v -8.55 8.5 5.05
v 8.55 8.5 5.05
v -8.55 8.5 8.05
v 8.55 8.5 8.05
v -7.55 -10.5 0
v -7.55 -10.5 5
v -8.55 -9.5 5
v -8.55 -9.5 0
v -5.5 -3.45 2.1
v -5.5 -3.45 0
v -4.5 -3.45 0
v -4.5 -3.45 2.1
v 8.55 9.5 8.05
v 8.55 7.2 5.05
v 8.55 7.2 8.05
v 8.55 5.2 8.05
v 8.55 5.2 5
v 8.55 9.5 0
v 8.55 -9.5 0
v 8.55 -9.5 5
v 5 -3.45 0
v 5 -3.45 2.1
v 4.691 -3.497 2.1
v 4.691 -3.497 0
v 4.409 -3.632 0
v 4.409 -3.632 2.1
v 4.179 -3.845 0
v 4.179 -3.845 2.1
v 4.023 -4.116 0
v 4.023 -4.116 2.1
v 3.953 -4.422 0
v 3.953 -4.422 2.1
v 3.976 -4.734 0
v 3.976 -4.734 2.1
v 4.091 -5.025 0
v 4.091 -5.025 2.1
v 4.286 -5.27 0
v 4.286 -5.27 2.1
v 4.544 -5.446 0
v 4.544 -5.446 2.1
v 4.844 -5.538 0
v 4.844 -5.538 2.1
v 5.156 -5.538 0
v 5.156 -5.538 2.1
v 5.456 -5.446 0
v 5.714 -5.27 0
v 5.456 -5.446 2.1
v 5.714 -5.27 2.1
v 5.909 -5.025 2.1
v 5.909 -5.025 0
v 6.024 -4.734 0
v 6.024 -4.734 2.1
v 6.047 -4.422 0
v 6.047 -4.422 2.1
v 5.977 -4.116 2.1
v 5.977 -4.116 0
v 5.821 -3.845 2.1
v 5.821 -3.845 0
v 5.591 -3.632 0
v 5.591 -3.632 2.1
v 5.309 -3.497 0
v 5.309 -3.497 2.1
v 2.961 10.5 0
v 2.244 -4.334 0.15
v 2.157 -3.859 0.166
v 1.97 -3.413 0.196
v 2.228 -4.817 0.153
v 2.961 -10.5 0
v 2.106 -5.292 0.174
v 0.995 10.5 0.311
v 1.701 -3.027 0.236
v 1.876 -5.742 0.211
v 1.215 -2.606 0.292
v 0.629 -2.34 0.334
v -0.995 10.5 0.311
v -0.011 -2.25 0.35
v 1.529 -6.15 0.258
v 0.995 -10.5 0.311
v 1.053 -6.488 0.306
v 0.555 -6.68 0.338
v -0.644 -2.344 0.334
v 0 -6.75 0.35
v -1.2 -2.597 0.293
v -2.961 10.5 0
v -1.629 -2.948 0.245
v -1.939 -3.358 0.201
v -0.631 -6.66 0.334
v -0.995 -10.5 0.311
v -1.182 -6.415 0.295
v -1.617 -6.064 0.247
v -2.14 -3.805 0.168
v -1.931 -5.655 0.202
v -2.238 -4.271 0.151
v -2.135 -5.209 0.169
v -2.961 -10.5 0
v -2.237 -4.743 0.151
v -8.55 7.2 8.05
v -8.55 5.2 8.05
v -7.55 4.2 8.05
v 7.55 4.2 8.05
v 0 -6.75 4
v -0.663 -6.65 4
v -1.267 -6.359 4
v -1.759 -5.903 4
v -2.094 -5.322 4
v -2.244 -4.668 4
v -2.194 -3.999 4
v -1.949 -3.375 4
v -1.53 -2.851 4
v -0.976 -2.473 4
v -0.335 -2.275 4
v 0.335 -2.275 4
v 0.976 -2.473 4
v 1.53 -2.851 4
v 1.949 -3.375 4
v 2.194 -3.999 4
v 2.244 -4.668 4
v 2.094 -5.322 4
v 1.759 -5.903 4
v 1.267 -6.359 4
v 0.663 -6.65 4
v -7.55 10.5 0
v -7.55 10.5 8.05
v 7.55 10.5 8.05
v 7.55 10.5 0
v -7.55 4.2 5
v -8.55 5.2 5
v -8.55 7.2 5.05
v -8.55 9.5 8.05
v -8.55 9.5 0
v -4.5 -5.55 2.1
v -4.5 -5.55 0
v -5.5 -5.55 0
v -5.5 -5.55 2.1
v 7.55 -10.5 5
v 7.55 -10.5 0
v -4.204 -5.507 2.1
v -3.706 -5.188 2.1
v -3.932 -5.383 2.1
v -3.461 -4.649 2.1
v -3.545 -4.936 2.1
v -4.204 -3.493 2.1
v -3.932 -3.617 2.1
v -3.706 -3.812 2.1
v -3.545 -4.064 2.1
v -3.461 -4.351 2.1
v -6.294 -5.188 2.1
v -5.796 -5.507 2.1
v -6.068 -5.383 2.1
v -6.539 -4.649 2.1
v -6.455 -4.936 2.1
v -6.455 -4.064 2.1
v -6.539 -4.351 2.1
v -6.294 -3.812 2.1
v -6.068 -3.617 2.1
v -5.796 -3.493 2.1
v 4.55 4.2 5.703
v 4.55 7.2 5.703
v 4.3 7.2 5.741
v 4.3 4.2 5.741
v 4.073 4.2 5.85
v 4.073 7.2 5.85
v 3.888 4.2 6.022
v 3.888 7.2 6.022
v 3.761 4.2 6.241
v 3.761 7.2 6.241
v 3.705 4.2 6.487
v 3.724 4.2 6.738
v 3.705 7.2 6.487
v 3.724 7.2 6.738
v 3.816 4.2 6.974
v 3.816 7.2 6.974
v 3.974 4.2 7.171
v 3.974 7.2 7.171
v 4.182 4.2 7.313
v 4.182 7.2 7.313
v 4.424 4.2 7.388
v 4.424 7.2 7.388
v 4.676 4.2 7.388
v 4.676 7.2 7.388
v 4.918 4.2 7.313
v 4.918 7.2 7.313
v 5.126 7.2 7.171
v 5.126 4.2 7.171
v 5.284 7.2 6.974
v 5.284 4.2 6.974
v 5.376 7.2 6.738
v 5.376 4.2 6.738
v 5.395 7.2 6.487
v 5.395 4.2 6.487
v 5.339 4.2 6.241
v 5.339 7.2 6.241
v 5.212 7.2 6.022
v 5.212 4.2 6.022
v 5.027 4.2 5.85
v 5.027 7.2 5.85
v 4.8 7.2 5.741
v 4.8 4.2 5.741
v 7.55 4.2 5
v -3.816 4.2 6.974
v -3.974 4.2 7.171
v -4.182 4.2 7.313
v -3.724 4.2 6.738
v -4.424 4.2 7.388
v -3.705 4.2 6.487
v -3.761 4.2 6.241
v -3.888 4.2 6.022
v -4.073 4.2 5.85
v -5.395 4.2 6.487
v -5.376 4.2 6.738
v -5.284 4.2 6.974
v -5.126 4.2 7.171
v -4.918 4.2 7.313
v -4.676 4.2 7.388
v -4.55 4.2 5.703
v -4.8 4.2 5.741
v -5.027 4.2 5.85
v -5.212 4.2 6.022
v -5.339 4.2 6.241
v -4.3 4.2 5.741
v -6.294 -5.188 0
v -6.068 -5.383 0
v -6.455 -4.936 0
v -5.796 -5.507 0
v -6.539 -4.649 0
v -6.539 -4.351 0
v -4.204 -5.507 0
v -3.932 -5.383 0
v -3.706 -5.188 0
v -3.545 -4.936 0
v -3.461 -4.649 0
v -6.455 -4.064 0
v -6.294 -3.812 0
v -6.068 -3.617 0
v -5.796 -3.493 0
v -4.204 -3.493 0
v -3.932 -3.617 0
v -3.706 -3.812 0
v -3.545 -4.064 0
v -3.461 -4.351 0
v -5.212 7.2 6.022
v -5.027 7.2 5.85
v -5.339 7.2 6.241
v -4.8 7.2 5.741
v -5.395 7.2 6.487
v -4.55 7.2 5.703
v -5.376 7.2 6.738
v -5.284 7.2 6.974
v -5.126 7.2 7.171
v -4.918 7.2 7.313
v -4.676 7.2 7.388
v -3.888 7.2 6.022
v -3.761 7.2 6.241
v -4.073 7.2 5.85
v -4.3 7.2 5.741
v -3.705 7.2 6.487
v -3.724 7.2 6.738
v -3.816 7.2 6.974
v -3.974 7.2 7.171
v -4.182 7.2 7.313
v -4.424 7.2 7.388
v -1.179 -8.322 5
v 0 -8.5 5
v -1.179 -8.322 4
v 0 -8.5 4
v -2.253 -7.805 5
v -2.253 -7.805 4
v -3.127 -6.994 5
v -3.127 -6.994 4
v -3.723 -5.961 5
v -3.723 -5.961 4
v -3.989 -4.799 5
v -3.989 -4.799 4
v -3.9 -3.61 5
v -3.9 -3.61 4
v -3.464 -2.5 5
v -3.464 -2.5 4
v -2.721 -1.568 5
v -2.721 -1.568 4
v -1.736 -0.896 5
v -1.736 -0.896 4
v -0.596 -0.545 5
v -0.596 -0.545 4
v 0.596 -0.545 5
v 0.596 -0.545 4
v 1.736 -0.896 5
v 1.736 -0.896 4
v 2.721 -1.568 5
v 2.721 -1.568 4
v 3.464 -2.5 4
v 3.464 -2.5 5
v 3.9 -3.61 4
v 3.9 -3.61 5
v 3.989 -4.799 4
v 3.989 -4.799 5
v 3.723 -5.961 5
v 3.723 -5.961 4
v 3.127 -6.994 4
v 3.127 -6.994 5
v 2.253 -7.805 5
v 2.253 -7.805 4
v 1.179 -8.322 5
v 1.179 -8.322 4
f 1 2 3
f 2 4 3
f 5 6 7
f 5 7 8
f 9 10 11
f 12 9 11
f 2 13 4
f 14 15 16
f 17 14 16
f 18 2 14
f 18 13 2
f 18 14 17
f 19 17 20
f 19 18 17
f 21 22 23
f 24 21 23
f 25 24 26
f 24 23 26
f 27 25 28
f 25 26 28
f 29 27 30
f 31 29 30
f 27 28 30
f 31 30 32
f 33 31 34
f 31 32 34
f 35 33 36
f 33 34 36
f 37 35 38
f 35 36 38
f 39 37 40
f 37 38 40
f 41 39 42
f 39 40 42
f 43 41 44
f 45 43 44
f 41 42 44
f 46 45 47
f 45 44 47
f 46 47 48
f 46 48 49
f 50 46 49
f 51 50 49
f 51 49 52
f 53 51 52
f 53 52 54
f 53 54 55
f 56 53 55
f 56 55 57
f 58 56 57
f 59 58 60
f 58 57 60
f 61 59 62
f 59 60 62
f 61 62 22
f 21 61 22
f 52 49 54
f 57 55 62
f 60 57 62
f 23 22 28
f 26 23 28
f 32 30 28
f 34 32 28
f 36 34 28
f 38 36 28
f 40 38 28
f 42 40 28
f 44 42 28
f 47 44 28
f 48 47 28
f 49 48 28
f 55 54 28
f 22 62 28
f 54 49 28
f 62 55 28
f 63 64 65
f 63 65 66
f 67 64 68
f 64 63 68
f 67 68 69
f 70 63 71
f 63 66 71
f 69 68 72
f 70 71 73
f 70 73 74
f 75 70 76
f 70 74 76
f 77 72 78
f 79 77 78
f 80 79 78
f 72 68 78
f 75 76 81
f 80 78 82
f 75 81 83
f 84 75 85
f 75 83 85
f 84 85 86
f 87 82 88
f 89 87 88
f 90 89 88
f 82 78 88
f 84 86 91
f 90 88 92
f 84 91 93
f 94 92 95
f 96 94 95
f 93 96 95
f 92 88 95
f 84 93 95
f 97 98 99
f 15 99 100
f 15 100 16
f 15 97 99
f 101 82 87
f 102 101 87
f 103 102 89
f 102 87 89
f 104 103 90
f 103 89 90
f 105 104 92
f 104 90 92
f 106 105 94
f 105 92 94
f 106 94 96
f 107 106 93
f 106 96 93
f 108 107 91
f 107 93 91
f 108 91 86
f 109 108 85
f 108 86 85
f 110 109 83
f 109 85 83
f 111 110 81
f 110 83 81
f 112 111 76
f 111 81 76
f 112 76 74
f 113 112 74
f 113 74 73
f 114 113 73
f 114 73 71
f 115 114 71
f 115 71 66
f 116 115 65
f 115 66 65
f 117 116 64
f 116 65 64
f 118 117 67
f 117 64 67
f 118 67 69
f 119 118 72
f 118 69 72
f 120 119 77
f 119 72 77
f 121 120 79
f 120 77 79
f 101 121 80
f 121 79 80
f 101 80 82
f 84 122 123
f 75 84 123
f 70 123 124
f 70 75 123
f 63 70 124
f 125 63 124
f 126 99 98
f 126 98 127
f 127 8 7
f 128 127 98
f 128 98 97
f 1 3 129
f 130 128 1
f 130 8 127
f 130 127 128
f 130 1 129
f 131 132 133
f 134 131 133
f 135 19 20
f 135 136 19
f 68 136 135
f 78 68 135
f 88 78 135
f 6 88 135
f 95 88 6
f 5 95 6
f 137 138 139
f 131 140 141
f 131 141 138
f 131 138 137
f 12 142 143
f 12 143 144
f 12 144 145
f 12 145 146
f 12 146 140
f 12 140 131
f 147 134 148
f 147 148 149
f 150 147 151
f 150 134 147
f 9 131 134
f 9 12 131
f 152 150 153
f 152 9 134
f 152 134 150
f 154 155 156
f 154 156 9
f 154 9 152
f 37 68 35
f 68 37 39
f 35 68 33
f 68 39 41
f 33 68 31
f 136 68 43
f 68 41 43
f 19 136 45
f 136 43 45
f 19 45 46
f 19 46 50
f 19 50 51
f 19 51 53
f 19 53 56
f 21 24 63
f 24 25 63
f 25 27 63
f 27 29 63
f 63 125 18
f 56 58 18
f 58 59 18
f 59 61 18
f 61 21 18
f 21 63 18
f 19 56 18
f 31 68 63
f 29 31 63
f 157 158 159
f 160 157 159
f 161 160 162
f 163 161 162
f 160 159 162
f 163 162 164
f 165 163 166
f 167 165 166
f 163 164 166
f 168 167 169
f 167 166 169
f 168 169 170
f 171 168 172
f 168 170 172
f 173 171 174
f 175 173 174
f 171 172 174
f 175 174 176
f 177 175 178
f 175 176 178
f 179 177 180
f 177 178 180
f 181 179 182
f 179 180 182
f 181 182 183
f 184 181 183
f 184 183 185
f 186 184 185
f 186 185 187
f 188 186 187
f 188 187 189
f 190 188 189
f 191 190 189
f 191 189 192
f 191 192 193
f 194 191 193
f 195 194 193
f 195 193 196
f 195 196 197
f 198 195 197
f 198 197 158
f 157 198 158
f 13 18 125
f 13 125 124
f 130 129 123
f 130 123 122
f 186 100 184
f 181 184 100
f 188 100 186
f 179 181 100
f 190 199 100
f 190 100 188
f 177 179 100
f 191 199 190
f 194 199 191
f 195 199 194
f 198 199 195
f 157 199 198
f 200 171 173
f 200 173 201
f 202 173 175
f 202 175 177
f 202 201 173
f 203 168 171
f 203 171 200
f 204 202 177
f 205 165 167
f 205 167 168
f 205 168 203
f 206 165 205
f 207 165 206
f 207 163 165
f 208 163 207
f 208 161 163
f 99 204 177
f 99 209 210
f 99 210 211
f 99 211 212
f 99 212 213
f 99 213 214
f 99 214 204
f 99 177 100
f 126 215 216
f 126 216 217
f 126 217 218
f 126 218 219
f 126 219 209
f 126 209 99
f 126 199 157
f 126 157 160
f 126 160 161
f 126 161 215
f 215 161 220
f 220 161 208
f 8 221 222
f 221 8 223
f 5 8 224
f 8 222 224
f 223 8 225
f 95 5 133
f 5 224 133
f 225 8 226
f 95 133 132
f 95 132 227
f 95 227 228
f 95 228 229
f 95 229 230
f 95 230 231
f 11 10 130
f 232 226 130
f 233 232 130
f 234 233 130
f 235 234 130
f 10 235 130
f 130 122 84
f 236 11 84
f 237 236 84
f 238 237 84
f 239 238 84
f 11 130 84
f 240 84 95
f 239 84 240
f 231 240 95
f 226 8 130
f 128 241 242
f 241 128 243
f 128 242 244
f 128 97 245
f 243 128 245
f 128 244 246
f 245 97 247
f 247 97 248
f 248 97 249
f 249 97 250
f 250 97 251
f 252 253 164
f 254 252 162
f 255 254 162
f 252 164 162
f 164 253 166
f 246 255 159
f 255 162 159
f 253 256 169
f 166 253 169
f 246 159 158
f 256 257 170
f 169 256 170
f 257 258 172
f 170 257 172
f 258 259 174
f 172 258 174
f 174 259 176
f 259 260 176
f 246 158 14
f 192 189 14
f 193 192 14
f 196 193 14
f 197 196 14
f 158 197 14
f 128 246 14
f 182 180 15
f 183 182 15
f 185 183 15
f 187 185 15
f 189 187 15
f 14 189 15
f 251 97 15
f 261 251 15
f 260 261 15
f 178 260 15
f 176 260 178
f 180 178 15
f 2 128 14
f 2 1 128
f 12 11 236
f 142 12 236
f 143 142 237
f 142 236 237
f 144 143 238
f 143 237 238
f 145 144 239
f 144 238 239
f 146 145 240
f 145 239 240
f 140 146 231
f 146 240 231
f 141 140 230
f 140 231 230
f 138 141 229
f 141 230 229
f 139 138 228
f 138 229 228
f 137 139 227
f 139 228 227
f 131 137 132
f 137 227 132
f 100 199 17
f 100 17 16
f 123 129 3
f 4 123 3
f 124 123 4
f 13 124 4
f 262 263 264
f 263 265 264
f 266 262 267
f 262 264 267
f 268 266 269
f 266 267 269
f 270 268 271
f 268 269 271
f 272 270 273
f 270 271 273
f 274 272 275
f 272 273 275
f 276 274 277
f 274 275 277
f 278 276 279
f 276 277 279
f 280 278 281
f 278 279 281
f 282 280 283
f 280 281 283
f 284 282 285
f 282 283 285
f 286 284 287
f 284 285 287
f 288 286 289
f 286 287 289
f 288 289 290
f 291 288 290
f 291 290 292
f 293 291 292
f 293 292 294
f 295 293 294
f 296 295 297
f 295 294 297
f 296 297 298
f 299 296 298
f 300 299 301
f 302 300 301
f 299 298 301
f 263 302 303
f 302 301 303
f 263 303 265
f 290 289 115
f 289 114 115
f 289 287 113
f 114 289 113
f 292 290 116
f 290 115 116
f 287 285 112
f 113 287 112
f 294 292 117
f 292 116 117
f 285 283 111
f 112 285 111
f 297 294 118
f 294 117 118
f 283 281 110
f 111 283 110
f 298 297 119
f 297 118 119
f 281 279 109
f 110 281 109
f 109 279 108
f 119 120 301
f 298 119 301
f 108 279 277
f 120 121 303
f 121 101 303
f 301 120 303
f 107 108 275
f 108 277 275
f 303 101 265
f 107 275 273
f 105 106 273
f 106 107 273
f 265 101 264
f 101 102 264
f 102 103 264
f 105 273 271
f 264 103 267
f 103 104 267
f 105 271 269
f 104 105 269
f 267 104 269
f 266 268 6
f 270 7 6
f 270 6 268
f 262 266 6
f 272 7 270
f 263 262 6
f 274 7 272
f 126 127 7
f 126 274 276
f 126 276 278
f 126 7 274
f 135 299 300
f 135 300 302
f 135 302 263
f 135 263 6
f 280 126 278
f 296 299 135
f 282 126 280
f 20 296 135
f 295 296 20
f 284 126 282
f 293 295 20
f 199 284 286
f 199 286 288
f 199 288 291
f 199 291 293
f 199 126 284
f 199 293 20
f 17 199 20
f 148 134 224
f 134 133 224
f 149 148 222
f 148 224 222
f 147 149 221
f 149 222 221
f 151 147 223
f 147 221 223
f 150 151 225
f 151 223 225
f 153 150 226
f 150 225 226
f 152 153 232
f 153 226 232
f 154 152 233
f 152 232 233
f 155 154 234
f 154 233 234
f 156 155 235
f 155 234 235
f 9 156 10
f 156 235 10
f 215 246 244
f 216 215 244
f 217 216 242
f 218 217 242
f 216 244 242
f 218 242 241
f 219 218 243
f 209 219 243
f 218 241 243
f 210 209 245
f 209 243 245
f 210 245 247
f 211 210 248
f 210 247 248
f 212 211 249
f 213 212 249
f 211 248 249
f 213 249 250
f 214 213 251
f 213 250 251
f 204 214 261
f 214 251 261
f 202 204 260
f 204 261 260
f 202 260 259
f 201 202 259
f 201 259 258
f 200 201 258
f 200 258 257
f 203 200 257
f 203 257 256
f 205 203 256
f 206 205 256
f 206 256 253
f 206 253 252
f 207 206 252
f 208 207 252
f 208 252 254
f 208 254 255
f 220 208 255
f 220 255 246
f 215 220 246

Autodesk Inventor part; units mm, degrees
ref_plane "YZ Plane" through (0, 0, 0) normal (1, 0, 0) x (0, 1, 0)
ref_plane "XZ Plane" through (0, 0, 0) normal (0, 1, 0) x (-1, 0, 0)
ref_plane "XY Plane" through (0, 0, 0) normal (0, 0, 1) x (1, 0, 0)
sketch "Sketch1" plane through (0, 0, 0) normal (0, 0, 1) x (1, 0, 0)
  line L0 (-8.55, 10.5) -> (8.55, 10.5)
  line L1 (8.55, 10.5) -> (8.55, -10.5)
  line L2 (8.55, -10.5) -> (-8.55, -10.5)
  line L3 (-8.55, -10.5) -> (-8.55, 10.5)
  point P0 (0, 0)
  dimension "LENGTH" = 17.1
  dimension "WIDTH" = 21
  dimension "d2" = 10.5
  dimension "d3" = 8.55
extrude "Extrusion1" add sketch "Sketch1" along normal blind 5
sketch "Sketch4" plane through (0, 0, 5) normal (0, 0, 1) x (1, 0, 0)
  line L0 (-8.55, -10.5) -> (8.55, -10.5) projected
  point P0 (0, 0)
  point P1 (0, -4.5)
  dimension "d16" = 0
  dimension "d17" = 6
hole "Hole1" at (0, -4.5, 5) direction (0, 0, -1) diameter 4.5 depth 5 counterbore diameter 8 counterbore depth 1 clearance for "Socket Head Cap Screw" size "#8" standard "Ansi Unified Screw Threads"
sketch "Sketch2" plane through (0, 0, 5) normal (0, 0, 1) x (1, 0, 0)
  line L0 (-8.55, 10.5) -> (8.55, 10.5)
  line L1 (8.55, 10.5) -> (8.55, 4.2)
  line L2 (8.55, 4.2) -> (-8.55, 4.2)
  line L3 (-8.55, 4.2) -> (-8.55, 10.5)
  line L4 (8.55, 6.5) -> (8.55, 5.2)
  line L5 (-8.55, 5.2) -> (-8.55, 6.5)
  point P0 (0, 0)
  dimension "d6" = 10.5
  dimension "d7" = 6.3
  dimension "d8" = 8.55
  dimension "d18" = 17.1
  dimension "d20" = 17.1
extrude "Extrusion2" add sketch "Sketch2" along normal blind 14.05
sketch "Sketch7" plane through (0, 0, 19.05) normal (0, 0, 1) x (1, 0, 0)
  line L0 (8.55, 8.5) -> (-8.55, 8.5)
  line L1 (-8.55, 8.5) -> (-8.55, 7.2)
  line L2 (-8.55, 7.2) -> (8.55, 7.2)
  line L3 (8.55, 7.2) -> (8.55, 8.5)
  line L4 (8.55, 4.2) -> (8.55, 10.5) projected
  line L5 (-8.55, 4.2) -> (8.55, 4.2) projected
  line L6 (8.55, 10.5) -> (-8.55, 10.5)
  line L7 (-8.55, 10.5) -> (-8.55, 4.2)
  line L8 (-8.55, 4.2) -> (8.55, 4.2)
  line L9 (8.55, 4.2) -> (8.55, 10.5)
  line L10 (8.55, 10.5) -> (-8.55, 10.5) projected
  point P0 (0, 0)
  point P1 (-8.55, 4.2)
  point P2 (8.55, 8.5)
  point P3 (8.55, 10.5)
  dimension "d53" = 0
  dimension "d54" = 17.1
  dimension "d55" = 1.3
  dimension "d56" = 3
  dimension "d59" = 0
  dimension "d60" = 0
  dimension "d61" = 0
  dimension "d62" = 0
extrude "Extrusion6" cut sketch "Sketch7" against normal blind 11 contours L0 L7 L6 L4 | L4 L5 L7 L2
extrude "Extrusion5" cut sketch "Sketch7" against normal blind 14 contours L3 L2 L1 L0
sketch "Sketch5" plane through (-8.55, 4.2, 5) normal (0, -1, 0) x (1, 0, 0)
  line L0 (0, 0) -> (0, 3.05) projected
  line L1 (17.1, 0) -> (17.1, 3.05) projected
  line L2 (17.1, 3.05) -> (0, 3.05) projected
  point P0 (8.55, -5)
  point P1 (4, 1.55)
  point P2 (13.1, 1.55)
  point P3 (0, 0.05)
  dimension "d34" = 0
  dimension "d36" = 4
  dimension "d37" = 4
  dimension "d66" = 1.5
hole "Hole2" at (-4.55, 4.2, 6.55) at (4.55, 4.2, 6.55) direction (0, 1, 0) diameter 1.6942 depth 3 thread size "2-56 UNC" class "2B" standard "ANSI Unified Screw Threads"
sketch "Sketch6" plane through (0, 0, 0) normal (0, 0, -1) x (-1, 0, 0)
  line L0 (5.5, -4.5) -> (4.5, -4.5) construction
  line L1 (5.5, -3.45) -> (4.5, -3.45)
  line L2 (4.5, -5.55) -> (5.5, -5.55)
  arc A0 (5.5, -5.55) -> (5.5, -3.45) centre (5.5, -4.5) ccw
  arc A1 (4.5, -3.45) -> (4.5, -5.55) centre (4.5, -4.5) ccw
  circle A2 centre (0, -4.5) radius 2.25 projected
  point P0 (0, 0)
  point P1 (-5, -4.5)
  point P2 (5, -4.5)
  dimension "d38" = 1
  dimension "d39" = 1.05
  dimension "d40" = 0
  dimension "d41" = 0
  dimension "d42" = 5
  dimension "d43" = 5
hole "Hole3" at (5, -4.5, 0) direction (0, 0, 1) diameter 2.1 depth 2.1
extrude "Extrusion4" cut sketch "Sketch6" against normal blind 2.1 contours A0 L2 A1 L1
chamfer "Chamfer1" distance 1 angle 45 6 edges at (-8.55, 4.2, 6.525) (8.55, 4.2, 6.525) (8.55, 10.5, 4.025) (-8.55, 10.5, 4.025) (8.55, -10.5, 2.5) (-8.55, -10.5, 2.5)
sketch "Sketch8" plane through (-7.55, -10.5, 0) normal (0, -1, 0) x (1, 0, 0)
  circle A0 centre (7.55, -12.35) radius 12.7
  point P0 (7.55, 0)
  dimension "d70" = 0
  dimension "d71" = 12.35
  dimension "d72" = 25.4
extrude "Extrusion7" cut sketch "Sketch8" against normal up to surface (21 mm away)
equation "\"d2\" = 0.5 * WIDTH"
equation "\"d3\" = 0.5 * LENGTH"
equation "\"d6\" = 0.5 * WIDTH"
equation "\"d8\" = 0.5 * LENGTH"
equation "\"d18\" = LENGTH"
equation "\"d20\" = LENGTH"
equation "\"d23\" = BEAM_HEIGHT - d4"
equation "\"d54\" = LENGTH"
equation "\"d55\" = DICHROIC_THICKNESS + TOLERANCE"
equation "\"TOLERANCE\" = 0.125"
equation "\"BEAM_HEIGHT\" = 19.05"
equation "\"d4\" = 5"
equation "\"DICHROIC_THICKNESS\" = 1.175"
properties part number "dichroic-mount"
